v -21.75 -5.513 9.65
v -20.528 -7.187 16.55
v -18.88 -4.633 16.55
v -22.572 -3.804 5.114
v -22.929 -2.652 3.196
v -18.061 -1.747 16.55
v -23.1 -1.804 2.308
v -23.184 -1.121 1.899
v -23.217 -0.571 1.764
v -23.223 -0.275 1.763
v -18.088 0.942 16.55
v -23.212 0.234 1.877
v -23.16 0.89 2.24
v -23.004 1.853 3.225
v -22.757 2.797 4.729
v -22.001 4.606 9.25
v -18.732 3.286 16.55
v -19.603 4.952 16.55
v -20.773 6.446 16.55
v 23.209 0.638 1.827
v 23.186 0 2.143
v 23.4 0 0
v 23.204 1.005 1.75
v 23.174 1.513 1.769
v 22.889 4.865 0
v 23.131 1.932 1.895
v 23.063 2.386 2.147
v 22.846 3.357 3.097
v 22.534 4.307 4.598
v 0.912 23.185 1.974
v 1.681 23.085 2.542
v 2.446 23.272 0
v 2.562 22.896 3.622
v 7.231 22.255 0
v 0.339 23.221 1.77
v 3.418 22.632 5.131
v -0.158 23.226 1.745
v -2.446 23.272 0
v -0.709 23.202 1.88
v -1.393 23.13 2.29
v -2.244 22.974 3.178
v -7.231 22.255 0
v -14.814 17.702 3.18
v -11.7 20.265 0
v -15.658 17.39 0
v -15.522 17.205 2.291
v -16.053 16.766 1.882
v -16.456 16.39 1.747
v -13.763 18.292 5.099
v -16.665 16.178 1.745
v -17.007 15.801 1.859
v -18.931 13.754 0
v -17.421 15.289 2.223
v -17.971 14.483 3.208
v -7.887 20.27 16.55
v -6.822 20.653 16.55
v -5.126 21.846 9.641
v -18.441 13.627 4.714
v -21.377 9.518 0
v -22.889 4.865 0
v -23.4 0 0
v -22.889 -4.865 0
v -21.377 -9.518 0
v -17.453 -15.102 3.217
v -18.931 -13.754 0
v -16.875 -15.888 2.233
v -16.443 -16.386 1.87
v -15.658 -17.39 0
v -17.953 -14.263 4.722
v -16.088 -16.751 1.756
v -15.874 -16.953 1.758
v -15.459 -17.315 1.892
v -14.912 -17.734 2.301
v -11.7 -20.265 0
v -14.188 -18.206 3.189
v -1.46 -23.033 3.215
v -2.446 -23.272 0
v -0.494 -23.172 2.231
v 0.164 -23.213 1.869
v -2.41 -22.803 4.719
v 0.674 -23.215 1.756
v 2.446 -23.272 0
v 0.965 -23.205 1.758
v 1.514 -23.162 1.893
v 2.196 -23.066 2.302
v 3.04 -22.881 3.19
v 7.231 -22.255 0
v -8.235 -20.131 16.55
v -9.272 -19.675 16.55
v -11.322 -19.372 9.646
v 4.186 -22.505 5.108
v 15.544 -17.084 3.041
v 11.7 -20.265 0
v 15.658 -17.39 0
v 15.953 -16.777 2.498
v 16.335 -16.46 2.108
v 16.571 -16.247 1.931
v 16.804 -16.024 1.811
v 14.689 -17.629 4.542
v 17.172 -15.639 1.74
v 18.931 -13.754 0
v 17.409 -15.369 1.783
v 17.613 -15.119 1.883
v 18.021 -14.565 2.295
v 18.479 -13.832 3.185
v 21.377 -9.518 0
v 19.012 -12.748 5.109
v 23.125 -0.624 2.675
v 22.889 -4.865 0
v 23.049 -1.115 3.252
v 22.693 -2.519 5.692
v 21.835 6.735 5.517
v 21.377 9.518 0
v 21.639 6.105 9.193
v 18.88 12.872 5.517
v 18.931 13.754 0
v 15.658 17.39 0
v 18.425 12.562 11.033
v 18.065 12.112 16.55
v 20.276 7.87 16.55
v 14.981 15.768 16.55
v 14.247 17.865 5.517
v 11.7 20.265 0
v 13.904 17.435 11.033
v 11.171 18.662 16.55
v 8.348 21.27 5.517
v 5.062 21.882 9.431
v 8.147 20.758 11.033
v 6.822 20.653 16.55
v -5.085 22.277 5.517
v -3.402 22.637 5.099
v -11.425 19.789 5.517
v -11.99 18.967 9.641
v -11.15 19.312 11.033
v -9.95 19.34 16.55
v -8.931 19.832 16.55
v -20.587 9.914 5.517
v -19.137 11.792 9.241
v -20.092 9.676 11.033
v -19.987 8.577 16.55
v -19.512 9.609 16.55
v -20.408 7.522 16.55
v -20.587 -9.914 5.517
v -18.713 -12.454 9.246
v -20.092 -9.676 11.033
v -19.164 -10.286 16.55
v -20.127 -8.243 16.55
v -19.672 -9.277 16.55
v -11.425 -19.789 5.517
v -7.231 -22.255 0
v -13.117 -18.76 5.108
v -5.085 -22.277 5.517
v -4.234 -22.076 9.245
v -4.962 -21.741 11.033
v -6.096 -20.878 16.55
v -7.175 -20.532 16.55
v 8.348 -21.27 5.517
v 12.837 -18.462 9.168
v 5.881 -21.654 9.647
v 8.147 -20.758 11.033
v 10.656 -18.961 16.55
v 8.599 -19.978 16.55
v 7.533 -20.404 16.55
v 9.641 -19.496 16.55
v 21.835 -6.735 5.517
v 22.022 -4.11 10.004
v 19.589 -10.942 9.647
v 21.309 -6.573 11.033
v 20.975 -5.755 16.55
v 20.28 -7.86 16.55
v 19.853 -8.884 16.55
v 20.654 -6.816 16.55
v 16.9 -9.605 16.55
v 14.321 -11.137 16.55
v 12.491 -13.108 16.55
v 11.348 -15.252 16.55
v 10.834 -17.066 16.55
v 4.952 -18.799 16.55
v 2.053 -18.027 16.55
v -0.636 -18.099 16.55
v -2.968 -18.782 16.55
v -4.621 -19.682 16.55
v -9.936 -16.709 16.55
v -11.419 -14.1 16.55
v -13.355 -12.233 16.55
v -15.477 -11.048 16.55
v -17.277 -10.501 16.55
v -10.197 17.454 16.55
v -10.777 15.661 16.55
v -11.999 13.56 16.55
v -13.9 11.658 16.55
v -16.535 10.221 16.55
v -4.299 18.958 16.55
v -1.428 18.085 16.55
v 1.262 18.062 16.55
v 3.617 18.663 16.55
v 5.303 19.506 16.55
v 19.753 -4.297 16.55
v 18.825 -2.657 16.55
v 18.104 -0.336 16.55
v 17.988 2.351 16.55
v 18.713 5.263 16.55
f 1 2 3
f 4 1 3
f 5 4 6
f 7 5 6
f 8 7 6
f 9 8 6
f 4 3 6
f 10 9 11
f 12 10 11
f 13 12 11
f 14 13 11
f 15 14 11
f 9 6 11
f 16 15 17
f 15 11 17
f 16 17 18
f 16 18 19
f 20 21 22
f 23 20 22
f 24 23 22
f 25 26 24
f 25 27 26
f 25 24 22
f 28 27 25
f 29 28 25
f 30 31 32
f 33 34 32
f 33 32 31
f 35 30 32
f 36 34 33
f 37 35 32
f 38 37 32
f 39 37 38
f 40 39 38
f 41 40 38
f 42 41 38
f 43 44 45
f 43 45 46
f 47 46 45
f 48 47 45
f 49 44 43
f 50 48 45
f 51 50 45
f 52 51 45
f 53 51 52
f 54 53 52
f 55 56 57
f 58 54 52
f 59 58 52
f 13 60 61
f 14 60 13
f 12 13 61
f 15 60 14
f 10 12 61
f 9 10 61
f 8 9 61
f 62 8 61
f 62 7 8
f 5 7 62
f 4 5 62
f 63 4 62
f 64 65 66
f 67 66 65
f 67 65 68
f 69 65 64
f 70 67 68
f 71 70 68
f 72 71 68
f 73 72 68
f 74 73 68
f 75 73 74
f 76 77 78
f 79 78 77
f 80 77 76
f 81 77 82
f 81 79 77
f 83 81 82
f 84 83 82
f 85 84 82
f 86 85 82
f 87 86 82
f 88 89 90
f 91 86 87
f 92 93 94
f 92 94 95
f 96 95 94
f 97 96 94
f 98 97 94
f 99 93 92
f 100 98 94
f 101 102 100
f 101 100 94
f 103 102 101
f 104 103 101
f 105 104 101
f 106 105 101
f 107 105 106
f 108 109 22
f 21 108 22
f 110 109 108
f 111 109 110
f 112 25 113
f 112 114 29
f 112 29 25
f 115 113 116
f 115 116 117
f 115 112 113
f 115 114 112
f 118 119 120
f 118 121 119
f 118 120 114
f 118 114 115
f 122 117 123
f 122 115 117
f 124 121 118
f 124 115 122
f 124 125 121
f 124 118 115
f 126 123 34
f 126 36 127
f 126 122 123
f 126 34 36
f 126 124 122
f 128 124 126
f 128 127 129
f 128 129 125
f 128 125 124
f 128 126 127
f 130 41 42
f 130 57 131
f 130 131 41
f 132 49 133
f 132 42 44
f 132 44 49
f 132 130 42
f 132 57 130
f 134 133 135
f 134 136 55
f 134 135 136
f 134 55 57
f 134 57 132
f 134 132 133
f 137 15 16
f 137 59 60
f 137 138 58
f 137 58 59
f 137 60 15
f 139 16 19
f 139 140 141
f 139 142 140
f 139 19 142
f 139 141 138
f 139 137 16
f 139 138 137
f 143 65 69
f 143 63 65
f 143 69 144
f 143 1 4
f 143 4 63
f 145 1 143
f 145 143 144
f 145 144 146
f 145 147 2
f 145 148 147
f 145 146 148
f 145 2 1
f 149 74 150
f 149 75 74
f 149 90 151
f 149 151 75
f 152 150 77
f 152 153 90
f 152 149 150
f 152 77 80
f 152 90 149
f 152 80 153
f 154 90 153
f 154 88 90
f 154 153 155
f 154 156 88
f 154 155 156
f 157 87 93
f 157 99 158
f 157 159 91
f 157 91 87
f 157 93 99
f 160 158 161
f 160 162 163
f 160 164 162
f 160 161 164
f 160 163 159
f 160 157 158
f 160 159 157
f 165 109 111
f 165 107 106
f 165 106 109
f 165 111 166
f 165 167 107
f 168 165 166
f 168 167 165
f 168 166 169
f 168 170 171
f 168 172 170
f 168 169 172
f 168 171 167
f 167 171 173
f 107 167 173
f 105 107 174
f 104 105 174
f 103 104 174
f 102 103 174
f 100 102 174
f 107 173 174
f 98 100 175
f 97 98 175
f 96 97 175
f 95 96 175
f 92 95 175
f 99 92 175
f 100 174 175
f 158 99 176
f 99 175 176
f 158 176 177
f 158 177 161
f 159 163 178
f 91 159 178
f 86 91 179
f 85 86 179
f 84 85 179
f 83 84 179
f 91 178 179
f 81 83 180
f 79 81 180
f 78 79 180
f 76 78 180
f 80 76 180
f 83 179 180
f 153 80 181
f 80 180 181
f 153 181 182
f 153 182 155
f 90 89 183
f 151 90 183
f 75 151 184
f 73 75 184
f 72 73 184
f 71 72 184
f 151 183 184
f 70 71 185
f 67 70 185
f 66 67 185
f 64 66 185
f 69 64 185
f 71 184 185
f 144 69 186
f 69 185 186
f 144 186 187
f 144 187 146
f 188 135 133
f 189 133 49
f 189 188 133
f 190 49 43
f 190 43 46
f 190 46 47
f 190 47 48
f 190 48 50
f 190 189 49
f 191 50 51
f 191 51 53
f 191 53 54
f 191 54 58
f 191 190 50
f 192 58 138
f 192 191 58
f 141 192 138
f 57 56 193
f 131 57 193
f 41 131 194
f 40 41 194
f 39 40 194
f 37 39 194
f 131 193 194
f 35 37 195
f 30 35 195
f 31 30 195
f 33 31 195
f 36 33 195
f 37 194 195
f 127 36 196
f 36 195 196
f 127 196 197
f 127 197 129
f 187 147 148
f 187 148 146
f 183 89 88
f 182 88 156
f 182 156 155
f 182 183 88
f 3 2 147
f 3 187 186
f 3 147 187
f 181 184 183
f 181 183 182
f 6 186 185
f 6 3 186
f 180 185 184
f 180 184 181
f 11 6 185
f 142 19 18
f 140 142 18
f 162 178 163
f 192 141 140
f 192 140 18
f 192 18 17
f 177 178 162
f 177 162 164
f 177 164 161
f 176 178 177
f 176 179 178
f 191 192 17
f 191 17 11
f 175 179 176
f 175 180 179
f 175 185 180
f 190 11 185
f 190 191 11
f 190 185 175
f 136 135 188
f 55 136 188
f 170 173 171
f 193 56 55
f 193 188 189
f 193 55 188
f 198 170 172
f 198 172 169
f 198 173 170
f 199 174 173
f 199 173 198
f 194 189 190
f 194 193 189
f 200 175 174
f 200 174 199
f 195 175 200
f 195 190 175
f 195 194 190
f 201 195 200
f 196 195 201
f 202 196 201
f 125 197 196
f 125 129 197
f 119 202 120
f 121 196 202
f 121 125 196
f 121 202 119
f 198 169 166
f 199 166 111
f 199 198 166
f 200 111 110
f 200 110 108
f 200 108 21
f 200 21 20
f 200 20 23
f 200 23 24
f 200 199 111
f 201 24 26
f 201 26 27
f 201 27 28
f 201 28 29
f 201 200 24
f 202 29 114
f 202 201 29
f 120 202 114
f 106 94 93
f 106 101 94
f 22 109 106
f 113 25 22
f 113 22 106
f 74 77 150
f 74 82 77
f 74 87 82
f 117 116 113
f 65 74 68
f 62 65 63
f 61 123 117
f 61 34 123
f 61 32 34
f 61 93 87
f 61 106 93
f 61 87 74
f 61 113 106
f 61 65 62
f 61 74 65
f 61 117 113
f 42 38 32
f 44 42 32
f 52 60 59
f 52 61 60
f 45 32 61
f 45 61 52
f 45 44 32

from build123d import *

# Parameters (mm, degrees)
REVOLVE1_ANGLE     = 19.5
CUT_EXTRUDE3_DEPTH = 30
REVOLVE2_ANGLE     = 19.5
CUT_EXTRUDE4_DEPTH = 30
REVOLVE3_ANGLE     = 19.5
CUT_EXTRUDE5_DEPTH = 30
REVOLVE4_ANGLE     = 19.5
CUT_EXTRUDE6_DEPTH = 30
REVOLVE5_ANGLE     = 19.5
CUT_EXTRUDE7_DEPTH = 30
REVOLVE6_ANGLE     = 19.5
CUT_EXTRUDE8_DEPTH = 30
REVOLVE7_ANGLE     = 19.5
CUT_EXTRUDE9_DEPTH = 30


# Read off the part's stored shape, not the designer's step: Boundary1
with BuildPart() as part:
    # Boundary1 outline → Boundary1 (revolve)
    with BuildSketch(Plane.XZ):
        Polygon((23.4, 0), (21.75, 16.55), (0, 16.55), (0, 0), align=None)
    revolve(axis=Axis((0, 0, 0), (0, 0, 1)))

    # Sketch3 → Revolve1 (revolve)
    with BuildSketch(Plane.XY.offset(16.55)):
        with BuildLine():
            ThreePointArc((6.7, 20.692329497), (0, 21.75), (-6.7, 20.692329497))
            ThreePointArc((-6.7, 20.692329497), (0, 18.897069907), (6.7, 20.692329497))
        make_face()
    revolve(axis=Axis((-21.75, 0, 16.55), (1, 0, 0)), revolution_arc=REVOLVE1_ANGLE)

    # Sketch21 → Cut-Extrude3 (cut)
    # profile 1 of 2: a face of its own
    with BuildSketch(Plane(origin=(0, -5.207626236, 14.705882831), x_dir=(1, 0, 0), z_dir=(0, -0.3338068592337716, 0.9426414910921781))):
        with BuildLine():
            Line((9.372530559, 28.241040631), (-9.372530559, 28.241040631))
            ThreePointArc((-9.372530559, 28.241040631), (0, 22.47450352), (9.372530559, 28.241040631))
        make_face()
        with BuildLine():
            ThreePointArc((6.7, 26.216833017), (0, 24.421573428), (-6.7, 26.216833017))
            ThreePointArc((-6.7, 26.216833017), (0, 27.27450352), (6.7, 26.216833017))
        make_face(mode=Mode.SUBTRACT)
    # profile 2 of 2: a face of its own
    with BuildSketch(Plane(origin=(0, -5.207626236, 14.705882831), x_dir=(1, 0, 0), z_dir=(0, -0.3338068592337716, 0.9426414910921781))):
        with BuildLine():
            ThreePointArc((6.7, 26.216833017), (0, 27.27450352), (-6.7, 26.216833017))
            ThreePointArc((-6.7, 26.216833017), (0, 24.421573428), (6.7, 26.216833017))
        make_face()
    extrude(amount=-CUT_EXTRUDE3_DEPTH, mode=Mode.SUBTRACT)

    # Sketch22 → Revolve2 (revolve)
    with BuildSketch(Plane.XY.offset(16.55)):
        with BuildLine():
            ThreePointArc((-19.454905378, 9.724667435), (-15.513197269, 15.244776499), (-10.062721237, 19.282223454))
            ThreePointArc((-10.062721237, 19.282223454), (-13.478343599, 13.245131366), (-19.454905378, 9.724667435))
        make_face()
    revolve(axis=Axis((-15.244776499, -15.513197269, 16.55), (0.7009092642998491, 0.7132504491541835, 0)), revolution_arc=REVOLVE2_ANGLE)

    # Sketch24 → Cut-Extrude4 (cut)
    with BuildSketch(Plane(origin=(3.714341752, -3.650073474, 14.705882831), x_dir=(0.971243492060928, 0.05687022863046558, -0.23119657485527895), z_dir=(0.23808789227923496, -0.23396832012378627, 0.9426414910921782))):
        with BuildLine():
            Line((-27.491870021, 14.371370891), (-13.585471932, 28.745378411))
            ThreePointArc((-13.585471932, 28.745378411), (-15.293280927, 16.483625521), (-27.491870021, 14.371370891))
        make_face()
    extrude(amount=-CUT_EXTRUDE4_DEPTH, mode=Mode.SUBTRACT)

    # Sketch25 → Revolve3 (revolve)
    with BuildSketch(Plane.XY.offset(16.55)):
        with BuildLine():
            ThreePointArc((-20.571898581, -7.061125177), (-21.74668737, -0.37958984), (-20.805796451, 6.338874823))
            ThreePointArc((-20.805796451, 6.338874823), (-18.893272141, -0.329783292), (-20.571898581, -7.061125177))
        make_face()
    revolve(axis=Axis((0.37958984, -21.74668737, 16.55), (-0.017452406437287054, 0.9998476951563913, 0)), revolution_arc=REVOLVE3_ANGLE)

    # Sketch26 → Cut-Extrude5 (cut)
    with BuildSketch(Plane(origin=(5.206833089, 0.09088561, 14.705882831), x_dir=(0.9426574907513692, -0.004123731024087582, -0.3337361981757048), z_dir=(0.33375601883228045, 0.00582573297890205, 0.9426414910921782))):
        with BuildLine():
            Line((-29.354887322, 9.164887842), (-30.256162535, -10.835112158))
            ThreePointArc((-30.256162535, -10.835112158), (-22.482645188, -1.165108658), (-29.354887322, 9.164887842))
        make_face()
    extrude(amount=-CUT_EXTRUDE5_DEPTH, mode=Mode.SUBTRACT)

    # Sketch27 → Revolve4 (revolve)
    with BuildSketch(Plane.XY.offset(16.55)):
        with BuildLine():
            ThreePointArc((-19.103667977, -10.397709836), (-14.971712021, -15.77689257), (-9.383651405, -19.621661151))
            ThreePointArc((-9.383651405, -19.621661151), (-13.007884538, -13.707450198), (-19.103667977, -10.397709836))
        make_face()
    revolve(axis=Axis((15.77689257, -14.971712021, 16.55), (-0.7253743710122916, 0.6883545756937498, 0)), revolution_arc=REVOLVE4_ANGLE)

    # Sketch28 → Cut-Extrude6 (cut)
    with BuildSketch(Plane(origin=(3.584693348, 3.777478605, 14.705882831), x_dir=(0.9732423250057362, -0.05845929079288866, -0.22222035941250265), z_dir=(0.2297774789515262, 0.24213494055628595, 0.9426414910921781))):
        with BuildLine():
            Line((-26.325903264, -15.059910067), (-12.852307992, -29.840377936))
            ThreePointArc((-12.852307992, -29.840377936), (-14.195389298, -17.533334095), (-26.325903264, -15.059910067))
        make_face()
    extrude(amount=-CUT_EXTRUDE6_DEPTH, mode=Mode.SUBTRACT)

    # Sketch29 → Revolve5 (revolve)
    with BuildSketch(Plane.XY.offset(16.55)):
        with BuildLine():
            ThreePointArc((-5.973766656, -20.913550917), (0.759064053, -21.736750488), (7.418070426, -20.445897661))
            ThreePointArc((7.418070426, -20.445897661), (0.659498229, -18.885558323), (-5.973766656, -20.913550917))
        make_face()
    revolve(axis=Axis((21.736750488, 0.759064053, 16.55), (-0.9993908270190959, -0.03489949670249739, 0)), revolution_arc=REVOLVE5_ANGLE)

    # Sketch30 → Cut-Extrude7 (cut)
    with BuildSketch(Plane(origin=(-0.181743535, 5.204453891, 14.705882831), x_dir=(0.9999321399924122, 0.0038771729275817748, 0.01098557874146117), z_dir=(-0.011649691383100024, 0.33360351311428743, 0.9426414910921777))):
        with BuildLine():
            Line((-9.086281711, -30.342992304), (10.880145152, -29.184632107))
            ThreePointArc((10.880145152, -29.184632107), (0.474220724, -22.477625897), (-9.086281711, -30.342992304))
        make_face()
    extrude(amount=-CUT_EXTRUDE7_DEPTH, mode=Mode.SUBTRACT)

    # Sketch31 → Revolve6 (revolve)
    with BuildSketch(Plane.XY.offset(16.55)):
        with BuildLine():
            ThreePointArc((19.782439975, -9.039777024), (16.035782076, -14.694087016), (10.729531193, -18.919293337))
            ThreePointArc((10.729531193, -18.919293337), (13.932381375, -12.766675382), (19.782439975, -9.039777024))
        make_face()
    revolve(axis=Axis((14.694087016, 16.035782076, 16.55), (-0.675590207615664, -0.7372773368101205, 0)), revolution_arc=REVOLVE6_ANGLE)

    # Sketch32 → Cut-Extrude8 (cut)
    with BuildSketch(Plane(origin=(-3.839464802, 3.51822129, 14.705882831), x_dir=(0.9692386501510535, 0.054574384261441185, 0.23999599087453166), z_dir=(-0.2461082321848259, 0.22551664533327645, 0.9426414910921782))):
        with BuildLine():
            Line((15.221586992, -29.008248881), (27.126990078, -12.937736215))
            ThreePointArc((27.126990078, -12.937736215), (15.309806614, -16.628450305), (15.221586992, -29.008248881))
        make_face()
    extrude(amount=-CUT_EXTRUDE8_DEPTH, mode=Mode.SUBTRACT)

    # Sketch33 → Revolve7 (revolve)
    with BuildSketch(Plane.XY.offset(16.55)):
        with BuildLine():
            ThreePointArc((20.313320471, 7.773770734), (21.720192381, 1.138307048), (21.014622285, -5.607865032))
            ThreePointArc((21.014622285, -5.607865032), (18.87117213, 0.988996224), (20.313320471, 7.773770734))
        make_face()
    revolve(axis=Axis((-1.138307048, 21.720192381, 16.55), (0.052335956242940865, -0.998629534754574, 0)), revolution_arc=REVOLVE7_ANGLE)

    # Sketch34 → Cut-Extrude9 (cut)
    with BuildSketch(Plane(origin=(-5.200489365, -0.272546099, 14.705882831), x_dir=(0.9427855723268154, -0.012319387513152558, 0.3331720235909673), z_dir=(-0.33334938853450696, -0.01747010117845218, 0.9426414910921781))):
        with BuildLine():
            Line((28.876049562, 11.693707416), (30.572326937, -8.234228831))
            ThreePointArc((30.572326937, -8.234228831), (22.452048009, 1.11073054), (28.876049562, 11.693707416))
        make_face()
    extrude(amount=-CUT_EXTRUDE9_DEPTH, mode=Mode.SUBTRACT)


solid = part.part
